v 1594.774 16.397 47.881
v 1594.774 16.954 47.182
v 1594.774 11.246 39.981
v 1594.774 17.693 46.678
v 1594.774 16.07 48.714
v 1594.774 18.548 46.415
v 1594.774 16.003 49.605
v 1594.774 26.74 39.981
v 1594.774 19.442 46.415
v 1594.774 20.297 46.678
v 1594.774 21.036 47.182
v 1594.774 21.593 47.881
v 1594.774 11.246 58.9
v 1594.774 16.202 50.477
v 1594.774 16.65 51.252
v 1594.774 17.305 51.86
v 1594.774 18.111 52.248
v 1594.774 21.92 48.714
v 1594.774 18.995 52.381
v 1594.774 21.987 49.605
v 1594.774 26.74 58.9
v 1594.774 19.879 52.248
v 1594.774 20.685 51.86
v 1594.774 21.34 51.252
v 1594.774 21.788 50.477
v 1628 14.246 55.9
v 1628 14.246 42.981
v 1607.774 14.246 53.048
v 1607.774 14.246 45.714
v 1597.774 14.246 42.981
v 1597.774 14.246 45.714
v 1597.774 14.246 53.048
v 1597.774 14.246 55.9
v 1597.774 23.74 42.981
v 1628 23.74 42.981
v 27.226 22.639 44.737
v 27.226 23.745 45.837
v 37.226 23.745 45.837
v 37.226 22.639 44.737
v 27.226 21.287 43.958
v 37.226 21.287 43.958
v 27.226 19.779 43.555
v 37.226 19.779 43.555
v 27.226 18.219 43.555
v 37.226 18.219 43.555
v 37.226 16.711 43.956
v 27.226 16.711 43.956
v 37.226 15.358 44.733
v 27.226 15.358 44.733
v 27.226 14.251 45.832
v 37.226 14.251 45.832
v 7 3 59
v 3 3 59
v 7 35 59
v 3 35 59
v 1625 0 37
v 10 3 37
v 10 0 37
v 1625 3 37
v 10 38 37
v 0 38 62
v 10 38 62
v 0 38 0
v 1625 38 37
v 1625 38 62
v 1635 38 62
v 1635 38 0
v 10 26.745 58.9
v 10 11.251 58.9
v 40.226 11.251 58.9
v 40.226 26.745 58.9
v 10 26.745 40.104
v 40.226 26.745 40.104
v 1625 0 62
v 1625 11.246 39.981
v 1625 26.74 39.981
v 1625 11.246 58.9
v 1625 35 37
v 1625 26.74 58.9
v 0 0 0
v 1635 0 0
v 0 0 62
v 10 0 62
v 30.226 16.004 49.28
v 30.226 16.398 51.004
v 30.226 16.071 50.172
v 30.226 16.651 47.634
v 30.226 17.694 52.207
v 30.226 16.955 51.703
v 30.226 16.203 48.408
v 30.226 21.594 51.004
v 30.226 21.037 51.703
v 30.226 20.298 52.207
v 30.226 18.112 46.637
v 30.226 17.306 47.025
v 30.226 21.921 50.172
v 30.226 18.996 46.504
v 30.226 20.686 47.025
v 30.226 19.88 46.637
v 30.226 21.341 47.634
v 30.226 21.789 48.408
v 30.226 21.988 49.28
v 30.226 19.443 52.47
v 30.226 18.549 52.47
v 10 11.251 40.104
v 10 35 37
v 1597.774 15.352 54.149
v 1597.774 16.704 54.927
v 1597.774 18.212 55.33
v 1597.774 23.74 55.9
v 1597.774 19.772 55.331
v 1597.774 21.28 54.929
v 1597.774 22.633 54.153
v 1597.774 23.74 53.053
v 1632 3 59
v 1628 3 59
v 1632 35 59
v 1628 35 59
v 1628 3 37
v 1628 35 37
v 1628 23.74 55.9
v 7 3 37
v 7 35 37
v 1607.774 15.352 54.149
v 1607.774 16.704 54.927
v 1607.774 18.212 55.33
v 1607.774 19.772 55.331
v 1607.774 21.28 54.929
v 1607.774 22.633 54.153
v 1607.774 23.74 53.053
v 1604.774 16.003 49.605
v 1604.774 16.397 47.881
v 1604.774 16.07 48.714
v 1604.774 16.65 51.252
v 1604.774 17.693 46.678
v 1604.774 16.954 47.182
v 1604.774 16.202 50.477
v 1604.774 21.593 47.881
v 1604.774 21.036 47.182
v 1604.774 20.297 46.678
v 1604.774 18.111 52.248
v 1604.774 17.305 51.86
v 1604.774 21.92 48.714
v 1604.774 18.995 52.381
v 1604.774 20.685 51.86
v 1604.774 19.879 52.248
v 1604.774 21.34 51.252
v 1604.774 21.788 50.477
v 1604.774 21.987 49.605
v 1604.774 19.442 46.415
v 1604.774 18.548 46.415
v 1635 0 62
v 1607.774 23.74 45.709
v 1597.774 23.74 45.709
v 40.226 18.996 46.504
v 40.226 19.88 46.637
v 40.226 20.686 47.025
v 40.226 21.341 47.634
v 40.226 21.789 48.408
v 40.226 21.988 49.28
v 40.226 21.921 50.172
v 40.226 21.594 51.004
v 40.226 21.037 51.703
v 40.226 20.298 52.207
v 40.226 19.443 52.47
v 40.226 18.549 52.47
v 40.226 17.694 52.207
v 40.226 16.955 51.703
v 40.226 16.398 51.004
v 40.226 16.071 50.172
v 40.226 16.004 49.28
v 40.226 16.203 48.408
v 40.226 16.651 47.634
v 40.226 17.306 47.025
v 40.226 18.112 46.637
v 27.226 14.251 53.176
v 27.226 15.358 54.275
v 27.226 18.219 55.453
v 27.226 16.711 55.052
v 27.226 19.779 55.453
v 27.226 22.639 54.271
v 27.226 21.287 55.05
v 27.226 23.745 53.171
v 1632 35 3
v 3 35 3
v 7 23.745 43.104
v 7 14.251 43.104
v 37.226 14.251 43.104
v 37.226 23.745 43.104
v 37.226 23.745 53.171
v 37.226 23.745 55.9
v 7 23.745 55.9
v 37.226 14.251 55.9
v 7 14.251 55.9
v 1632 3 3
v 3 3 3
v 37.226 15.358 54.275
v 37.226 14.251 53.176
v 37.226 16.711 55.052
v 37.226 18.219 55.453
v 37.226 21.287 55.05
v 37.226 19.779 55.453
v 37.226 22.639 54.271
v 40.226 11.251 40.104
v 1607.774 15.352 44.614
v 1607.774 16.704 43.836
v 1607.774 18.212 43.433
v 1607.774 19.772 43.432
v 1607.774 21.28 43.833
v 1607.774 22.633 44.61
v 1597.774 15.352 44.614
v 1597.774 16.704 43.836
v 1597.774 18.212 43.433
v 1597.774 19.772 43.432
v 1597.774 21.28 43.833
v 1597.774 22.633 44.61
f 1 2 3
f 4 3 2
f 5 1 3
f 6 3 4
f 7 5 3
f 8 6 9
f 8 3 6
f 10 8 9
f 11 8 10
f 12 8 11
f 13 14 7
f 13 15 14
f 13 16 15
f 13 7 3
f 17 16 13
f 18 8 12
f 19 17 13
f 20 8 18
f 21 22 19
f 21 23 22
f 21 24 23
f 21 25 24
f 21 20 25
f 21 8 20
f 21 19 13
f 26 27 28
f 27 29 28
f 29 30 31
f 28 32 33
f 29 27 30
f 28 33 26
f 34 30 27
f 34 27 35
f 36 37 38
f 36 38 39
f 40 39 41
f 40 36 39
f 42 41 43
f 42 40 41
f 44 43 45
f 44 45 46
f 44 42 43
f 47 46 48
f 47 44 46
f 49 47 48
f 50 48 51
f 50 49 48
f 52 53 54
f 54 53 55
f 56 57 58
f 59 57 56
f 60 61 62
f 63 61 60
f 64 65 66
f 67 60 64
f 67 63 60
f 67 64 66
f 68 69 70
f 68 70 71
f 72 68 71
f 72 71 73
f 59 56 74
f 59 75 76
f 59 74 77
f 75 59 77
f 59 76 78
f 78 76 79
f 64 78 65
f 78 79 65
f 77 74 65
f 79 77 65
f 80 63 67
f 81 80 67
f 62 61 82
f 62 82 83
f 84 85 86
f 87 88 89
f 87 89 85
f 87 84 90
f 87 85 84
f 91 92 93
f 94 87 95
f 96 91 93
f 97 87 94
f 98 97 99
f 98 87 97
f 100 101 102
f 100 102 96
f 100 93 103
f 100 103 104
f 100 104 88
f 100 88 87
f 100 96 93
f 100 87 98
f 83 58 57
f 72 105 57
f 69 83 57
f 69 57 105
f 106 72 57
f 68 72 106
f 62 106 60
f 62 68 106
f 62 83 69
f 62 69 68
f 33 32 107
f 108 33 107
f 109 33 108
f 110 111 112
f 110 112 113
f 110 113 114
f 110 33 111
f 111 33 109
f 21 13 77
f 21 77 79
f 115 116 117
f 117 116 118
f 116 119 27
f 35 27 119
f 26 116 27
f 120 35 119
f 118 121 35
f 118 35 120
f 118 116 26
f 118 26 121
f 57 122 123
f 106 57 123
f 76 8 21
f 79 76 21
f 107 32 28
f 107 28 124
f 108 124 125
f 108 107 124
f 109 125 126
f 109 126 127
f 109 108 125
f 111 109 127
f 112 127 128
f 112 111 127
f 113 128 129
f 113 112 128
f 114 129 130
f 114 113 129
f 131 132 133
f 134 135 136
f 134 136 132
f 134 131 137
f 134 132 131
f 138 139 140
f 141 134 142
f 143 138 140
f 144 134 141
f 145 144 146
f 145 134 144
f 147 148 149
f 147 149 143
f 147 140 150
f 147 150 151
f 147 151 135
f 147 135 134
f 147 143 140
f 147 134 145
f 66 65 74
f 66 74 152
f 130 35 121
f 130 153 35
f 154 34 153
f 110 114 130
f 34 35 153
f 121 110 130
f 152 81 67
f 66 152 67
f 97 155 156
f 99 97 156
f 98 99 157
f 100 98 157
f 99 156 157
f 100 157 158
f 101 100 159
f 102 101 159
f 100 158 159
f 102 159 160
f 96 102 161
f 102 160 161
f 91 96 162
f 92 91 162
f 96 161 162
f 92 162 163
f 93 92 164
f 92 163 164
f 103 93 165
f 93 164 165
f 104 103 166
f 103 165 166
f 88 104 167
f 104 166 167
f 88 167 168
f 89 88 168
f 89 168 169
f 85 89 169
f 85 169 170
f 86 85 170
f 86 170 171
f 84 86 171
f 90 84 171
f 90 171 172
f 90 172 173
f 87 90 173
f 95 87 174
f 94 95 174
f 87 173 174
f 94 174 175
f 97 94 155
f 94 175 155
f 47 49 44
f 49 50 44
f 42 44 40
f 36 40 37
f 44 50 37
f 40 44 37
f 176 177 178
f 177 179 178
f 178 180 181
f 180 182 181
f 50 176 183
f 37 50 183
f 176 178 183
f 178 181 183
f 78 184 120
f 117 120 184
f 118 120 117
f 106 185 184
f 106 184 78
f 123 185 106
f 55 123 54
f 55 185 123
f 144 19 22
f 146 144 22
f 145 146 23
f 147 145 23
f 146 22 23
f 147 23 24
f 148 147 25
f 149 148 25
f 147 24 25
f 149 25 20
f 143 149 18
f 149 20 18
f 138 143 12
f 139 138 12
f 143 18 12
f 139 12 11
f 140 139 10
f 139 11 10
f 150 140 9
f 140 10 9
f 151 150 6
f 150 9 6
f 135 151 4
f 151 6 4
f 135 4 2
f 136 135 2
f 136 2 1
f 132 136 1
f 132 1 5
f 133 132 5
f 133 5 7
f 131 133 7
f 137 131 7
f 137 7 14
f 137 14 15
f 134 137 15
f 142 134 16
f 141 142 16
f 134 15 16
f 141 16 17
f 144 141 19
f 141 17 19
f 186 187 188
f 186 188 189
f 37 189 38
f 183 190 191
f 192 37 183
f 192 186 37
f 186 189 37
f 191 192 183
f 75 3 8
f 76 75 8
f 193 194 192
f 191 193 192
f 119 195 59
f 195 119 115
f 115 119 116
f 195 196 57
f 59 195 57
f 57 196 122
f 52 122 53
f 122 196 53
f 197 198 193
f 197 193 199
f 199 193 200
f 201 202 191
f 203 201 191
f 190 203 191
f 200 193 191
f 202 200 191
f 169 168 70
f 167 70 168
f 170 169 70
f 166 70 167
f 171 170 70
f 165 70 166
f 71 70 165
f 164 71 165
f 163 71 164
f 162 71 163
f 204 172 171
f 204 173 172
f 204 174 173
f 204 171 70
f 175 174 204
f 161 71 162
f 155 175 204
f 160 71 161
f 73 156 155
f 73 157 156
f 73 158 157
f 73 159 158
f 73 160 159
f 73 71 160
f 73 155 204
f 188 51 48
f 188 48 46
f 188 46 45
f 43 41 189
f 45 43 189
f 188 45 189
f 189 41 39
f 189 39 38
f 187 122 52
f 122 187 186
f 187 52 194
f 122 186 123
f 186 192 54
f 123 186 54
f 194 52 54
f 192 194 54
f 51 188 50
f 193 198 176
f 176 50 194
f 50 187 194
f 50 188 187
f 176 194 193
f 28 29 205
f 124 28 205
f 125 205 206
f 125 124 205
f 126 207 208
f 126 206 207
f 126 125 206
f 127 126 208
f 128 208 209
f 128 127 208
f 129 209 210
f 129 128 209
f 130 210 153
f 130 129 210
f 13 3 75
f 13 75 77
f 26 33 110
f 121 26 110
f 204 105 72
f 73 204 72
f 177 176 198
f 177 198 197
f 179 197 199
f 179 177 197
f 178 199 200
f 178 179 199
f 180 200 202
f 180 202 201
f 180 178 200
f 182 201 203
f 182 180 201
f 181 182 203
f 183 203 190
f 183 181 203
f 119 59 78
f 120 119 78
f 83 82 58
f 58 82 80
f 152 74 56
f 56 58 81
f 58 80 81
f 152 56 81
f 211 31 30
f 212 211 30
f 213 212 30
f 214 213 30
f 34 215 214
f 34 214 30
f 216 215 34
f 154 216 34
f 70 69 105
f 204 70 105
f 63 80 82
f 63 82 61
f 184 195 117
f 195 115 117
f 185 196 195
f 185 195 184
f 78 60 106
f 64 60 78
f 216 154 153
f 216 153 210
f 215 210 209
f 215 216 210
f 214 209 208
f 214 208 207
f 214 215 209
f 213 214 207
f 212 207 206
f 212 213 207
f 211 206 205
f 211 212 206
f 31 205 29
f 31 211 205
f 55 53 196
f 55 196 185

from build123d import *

# Parameters (mm, degrees)
SKETCH1_W            = 1635
SKETCH1_H            = 38
BOSS_EXTRUDE1_DEPTH  = 62
SKETCH2_W            = 1615
SKETCH2_H            = 38
CUT_EXTRUDE1_DEPTH   = 25
SKETCH3_W            = 18.796
SKETCH3_H            = 15.494
BOSS_EXTRUDE2_DEPTH  = 30.226
SKETCH5_W            = 18.91876422
SKETCH5_H            = 15.494
BOSS_EXTRUDE3_DEPTH  = 30.226
SKETCH6_R            = 3
CUT_EXTRUDE2_DEPTH   = 10
SKETCH7_R            = 3
CUT_EXTRUDE3_DEPTH   = 10
SHELL1_START         = 3
SHELL1_OUTLINE_W     = 32
SHELL1_OUTLINE_H     = 34
SHELL1_DEPTH         = 1629
SHELL1_START_2       = 1607.774
SHELL1_2_OUTLINE_W   = 9.494
SHELL1_2_OUTLINE_H   = 12.91876422
SHELL1_2_DEPTH       = 24.226
SHELL1_3_OUTLINE_W   = 9.494
SHELL1_3_OUTLINE_H   = 12.796
SHELL1_3_DEPTH       = 24.226
SHELL1_4_OUTLINE_W   = 32
SHELL1_4_OUTLINE_H   = 22
SHELL1_4_OUTLINE_W_2 = 9.494
SHELL1_4_OUTLINE_H_2 = 12.796
SHELL1_4_DEPTH       = 4
SHELL1_START_3       = 1628
SHELL1_5_OUTLINE_W   = 32
SHELL1_5_OUTLINE_H   = 22
SHELL1_5_OUTLINE_W_2 = 9.494
SHELL1_5_OUTLINE_H_2 = 12.91876422
SHELL1_5_DEPTH       = 4
SHELL1_START_4       = 1597.774
SHELL1_6_DEPTH       = 10
SHELL1_START_5       = 27.226
SHELL1_7_DEPTH       = 10


# Read off the part's stored shape, not the designer's step: Shell1
with BuildPart() as part:
    # Sketch1 → Boss-Extrude1 (new body)
    with BuildSketch(Plane.XY):
        with Locations((817.5, 19)):
            Rectangle(SKETCH1_W, SKETCH1_H)
    extrude(amount=BOSS_EXTRUDE1_DEPTH)

    # Sketch2 → Cut-Extrude1 (cut)
    with BuildSketch(Plane.XY.offset(62)):
        with Locations((817.5, 19)):
            Rectangle(SKETCH2_W, SKETCH2_H)
    extrude(amount=-CUT_EXTRUDE1_DEPTH, mode=Mode.SUBTRACT)

    # Sketch3 → Boss-Extrude2 (add)
    with BuildSketch(Plane(origin=(10, 0, 0), x_dir=(0, 0, -1), z_dir=(1, 0, 0))):
        with Locations((-49.502, 18.998)):
            Rectangle(SKETCH3_W, SKETCH3_H)
    extrude(amount=BOSS_EXTRUDE2_DEPTH)

    # Sketch5 → Boss-Extrude3 (add)
    with BuildSketch(Plane.ZY.offset(-1625)):
        with Locations((49.44061789, 18.993)):
            Rectangle(SKETCH5_W, SKETCH5_H)
    extrude(amount=BOSS_EXTRUDE3_DEPTH)

    # Sketch6 → Cut-Extrude2 (cut)
    with BuildSketch(Plane(origin=(40.226, 0, 0), x_dir=(0, 0, -1), z_dir=(1, 0, 0))):
        with Locations((-49.504, 18.996)):
            Circle(SKETCH6_R)
    extrude(amount=-CUT_EXTRUDE2_DEPTH, mode=Mode.SUBTRACT)

    # Sketch7 → Cut-Extrude3 (cut)
    with BuildSketch(Plane.ZY.offset(-1594.774)):
        with Locations((49.38123578, 18.995)):
            Circle(SKETCH7_R)
    extrude(amount=-CUT_EXTRUDE3_DEPTH, mode=Mode.SUBTRACT)

    # Shell1 outline → Shell1 (cut)
    with BuildSketch(Plane.YZ.offset(SHELL1_START)):
        with Locations((19, 20)):
            Rectangle(SHELL1_OUTLINE_W, SHELL1_OUTLINE_H)
    extrude(amount=SHELL1_DEPTH, mode=Mode.SUBTRACT)

    # Shell1 2 outline → Shell1 2 (cut)
    with BuildSketch(Plane.YZ.offset(SHELL1_START_2)):
        with Locations((18.993, 49.44061789)):
            Rectangle(SHELL1_2_OUTLINE_W, SHELL1_2_OUTLINE_H)
    extrude(amount=SHELL1_2_DEPTH, mode=Mode.SUBTRACT)

    # Shell1 3 outline → Shell1 3 (cut)
    with BuildSketch(Plane.YZ.offset(SHELL1_START)):
        with Locations((18.998, 49.502)):
            Rectangle(SHELL1_3_OUTLINE_W, SHELL1_3_OUTLINE_H)
    extrude(amount=SHELL1_3_DEPTH, mode=Mode.SUBTRACT)

    # Shell1 4 outline → Shell1 4 (cut)
    with BuildSketch(Plane.YZ.offset(SHELL1_START)):
        with Locations((19, 48)):
            Rectangle(SHELL1_4_OUTLINE_W, SHELL1_4_OUTLINE_H)
        with Locations((18.998, 49.502)):
            Rectangle(SHELL1_4_OUTLINE_W_2, SHELL1_4_OUTLINE_H_2, mode=Mode.SUBTRACT)
    extrude(amount=SHELL1_4_DEPTH, mode=Mode.SUBTRACT)

    # Shell1 5 outline → Shell1 5 (cut)
    with BuildSketch(Plane.YZ.offset(SHELL1_START_3)):
        with Locations((19, 48)):
            Rectangle(SHELL1_5_OUTLINE_W, SHELL1_5_OUTLINE_H)
        with Locations((18.993, 49.44061789)):
            Rectangle(SHELL1_5_OUTLINE_W_2, SHELL1_5_OUTLINE_H_2, mode=Mode.SUBTRACT)
    extrude(amount=SHELL1_5_DEPTH, mode=Mode.SUBTRACT)

    # Shell1 6 outline → Shell1 6 (cut)
    with BuildSketch(Plane.YZ.offset(SHELL1_START_4)):
        with BuildLine():
            Line((23.74, 55.9), (14.246, 55.9))
            Line((14.246, 55.9), (14.246, 53.048250779))
            ThreePointArc((14.246, 53.048250779), (18.991729891, 55.381234889), (23.74, 53.053425182))
            Line((23.74, 53.053425182), (23.74, 55.9))
        make_face()
        with BuildLine():
            ThreePointArc((23.74, 45.709046379), (18.991729891, 43.381236672), (14.246, 45.714220782))
            Line((14.246, 45.714220782), (14.246, 42.98123578))
            Line((14.246, 42.98123578), (23.74, 42.98123578))
            Line((23.74, 42.98123578), (23.74, 45.709046379))
        make_face()
    extrude(amount=SHELL1_6_DEPTH, mode=Mode.SUBTRACT)

    # Shell1 7 outline → Shell1 7 (cut)
    with BuildSketch(Plane.YZ.offset(SHELL1_START_5)):
        with BuildLine():
            Line((23.745, 53.171014999), (23.745, 55.9))
            Line((23.745, 55.9), (14.251, 55.9))
            Line((14.251, 55.9), (14.251, 53.176189401))
            ThreePointArc((14.251, 53.176189401), (18.999270109, 55.503999109), (23.745, 53.171014999))
        make_face()
        with BuildLine():
            Line((23.745, 43.104), (23.745, 45.836985001))
            ThreePointArc((23.745, 45.836985001), (18.999270109, 43.504000891), (14.251, 45.831810599))
            Line((14.251, 45.831810599), (14.251, 43.104))
            Line((14.251, 43.104), (23.745, 43.104))
        make_face()
    extrude(amount=SHELL1_7_DEPTH, mode=Mode.SUBTRACT)


solid = part.part
